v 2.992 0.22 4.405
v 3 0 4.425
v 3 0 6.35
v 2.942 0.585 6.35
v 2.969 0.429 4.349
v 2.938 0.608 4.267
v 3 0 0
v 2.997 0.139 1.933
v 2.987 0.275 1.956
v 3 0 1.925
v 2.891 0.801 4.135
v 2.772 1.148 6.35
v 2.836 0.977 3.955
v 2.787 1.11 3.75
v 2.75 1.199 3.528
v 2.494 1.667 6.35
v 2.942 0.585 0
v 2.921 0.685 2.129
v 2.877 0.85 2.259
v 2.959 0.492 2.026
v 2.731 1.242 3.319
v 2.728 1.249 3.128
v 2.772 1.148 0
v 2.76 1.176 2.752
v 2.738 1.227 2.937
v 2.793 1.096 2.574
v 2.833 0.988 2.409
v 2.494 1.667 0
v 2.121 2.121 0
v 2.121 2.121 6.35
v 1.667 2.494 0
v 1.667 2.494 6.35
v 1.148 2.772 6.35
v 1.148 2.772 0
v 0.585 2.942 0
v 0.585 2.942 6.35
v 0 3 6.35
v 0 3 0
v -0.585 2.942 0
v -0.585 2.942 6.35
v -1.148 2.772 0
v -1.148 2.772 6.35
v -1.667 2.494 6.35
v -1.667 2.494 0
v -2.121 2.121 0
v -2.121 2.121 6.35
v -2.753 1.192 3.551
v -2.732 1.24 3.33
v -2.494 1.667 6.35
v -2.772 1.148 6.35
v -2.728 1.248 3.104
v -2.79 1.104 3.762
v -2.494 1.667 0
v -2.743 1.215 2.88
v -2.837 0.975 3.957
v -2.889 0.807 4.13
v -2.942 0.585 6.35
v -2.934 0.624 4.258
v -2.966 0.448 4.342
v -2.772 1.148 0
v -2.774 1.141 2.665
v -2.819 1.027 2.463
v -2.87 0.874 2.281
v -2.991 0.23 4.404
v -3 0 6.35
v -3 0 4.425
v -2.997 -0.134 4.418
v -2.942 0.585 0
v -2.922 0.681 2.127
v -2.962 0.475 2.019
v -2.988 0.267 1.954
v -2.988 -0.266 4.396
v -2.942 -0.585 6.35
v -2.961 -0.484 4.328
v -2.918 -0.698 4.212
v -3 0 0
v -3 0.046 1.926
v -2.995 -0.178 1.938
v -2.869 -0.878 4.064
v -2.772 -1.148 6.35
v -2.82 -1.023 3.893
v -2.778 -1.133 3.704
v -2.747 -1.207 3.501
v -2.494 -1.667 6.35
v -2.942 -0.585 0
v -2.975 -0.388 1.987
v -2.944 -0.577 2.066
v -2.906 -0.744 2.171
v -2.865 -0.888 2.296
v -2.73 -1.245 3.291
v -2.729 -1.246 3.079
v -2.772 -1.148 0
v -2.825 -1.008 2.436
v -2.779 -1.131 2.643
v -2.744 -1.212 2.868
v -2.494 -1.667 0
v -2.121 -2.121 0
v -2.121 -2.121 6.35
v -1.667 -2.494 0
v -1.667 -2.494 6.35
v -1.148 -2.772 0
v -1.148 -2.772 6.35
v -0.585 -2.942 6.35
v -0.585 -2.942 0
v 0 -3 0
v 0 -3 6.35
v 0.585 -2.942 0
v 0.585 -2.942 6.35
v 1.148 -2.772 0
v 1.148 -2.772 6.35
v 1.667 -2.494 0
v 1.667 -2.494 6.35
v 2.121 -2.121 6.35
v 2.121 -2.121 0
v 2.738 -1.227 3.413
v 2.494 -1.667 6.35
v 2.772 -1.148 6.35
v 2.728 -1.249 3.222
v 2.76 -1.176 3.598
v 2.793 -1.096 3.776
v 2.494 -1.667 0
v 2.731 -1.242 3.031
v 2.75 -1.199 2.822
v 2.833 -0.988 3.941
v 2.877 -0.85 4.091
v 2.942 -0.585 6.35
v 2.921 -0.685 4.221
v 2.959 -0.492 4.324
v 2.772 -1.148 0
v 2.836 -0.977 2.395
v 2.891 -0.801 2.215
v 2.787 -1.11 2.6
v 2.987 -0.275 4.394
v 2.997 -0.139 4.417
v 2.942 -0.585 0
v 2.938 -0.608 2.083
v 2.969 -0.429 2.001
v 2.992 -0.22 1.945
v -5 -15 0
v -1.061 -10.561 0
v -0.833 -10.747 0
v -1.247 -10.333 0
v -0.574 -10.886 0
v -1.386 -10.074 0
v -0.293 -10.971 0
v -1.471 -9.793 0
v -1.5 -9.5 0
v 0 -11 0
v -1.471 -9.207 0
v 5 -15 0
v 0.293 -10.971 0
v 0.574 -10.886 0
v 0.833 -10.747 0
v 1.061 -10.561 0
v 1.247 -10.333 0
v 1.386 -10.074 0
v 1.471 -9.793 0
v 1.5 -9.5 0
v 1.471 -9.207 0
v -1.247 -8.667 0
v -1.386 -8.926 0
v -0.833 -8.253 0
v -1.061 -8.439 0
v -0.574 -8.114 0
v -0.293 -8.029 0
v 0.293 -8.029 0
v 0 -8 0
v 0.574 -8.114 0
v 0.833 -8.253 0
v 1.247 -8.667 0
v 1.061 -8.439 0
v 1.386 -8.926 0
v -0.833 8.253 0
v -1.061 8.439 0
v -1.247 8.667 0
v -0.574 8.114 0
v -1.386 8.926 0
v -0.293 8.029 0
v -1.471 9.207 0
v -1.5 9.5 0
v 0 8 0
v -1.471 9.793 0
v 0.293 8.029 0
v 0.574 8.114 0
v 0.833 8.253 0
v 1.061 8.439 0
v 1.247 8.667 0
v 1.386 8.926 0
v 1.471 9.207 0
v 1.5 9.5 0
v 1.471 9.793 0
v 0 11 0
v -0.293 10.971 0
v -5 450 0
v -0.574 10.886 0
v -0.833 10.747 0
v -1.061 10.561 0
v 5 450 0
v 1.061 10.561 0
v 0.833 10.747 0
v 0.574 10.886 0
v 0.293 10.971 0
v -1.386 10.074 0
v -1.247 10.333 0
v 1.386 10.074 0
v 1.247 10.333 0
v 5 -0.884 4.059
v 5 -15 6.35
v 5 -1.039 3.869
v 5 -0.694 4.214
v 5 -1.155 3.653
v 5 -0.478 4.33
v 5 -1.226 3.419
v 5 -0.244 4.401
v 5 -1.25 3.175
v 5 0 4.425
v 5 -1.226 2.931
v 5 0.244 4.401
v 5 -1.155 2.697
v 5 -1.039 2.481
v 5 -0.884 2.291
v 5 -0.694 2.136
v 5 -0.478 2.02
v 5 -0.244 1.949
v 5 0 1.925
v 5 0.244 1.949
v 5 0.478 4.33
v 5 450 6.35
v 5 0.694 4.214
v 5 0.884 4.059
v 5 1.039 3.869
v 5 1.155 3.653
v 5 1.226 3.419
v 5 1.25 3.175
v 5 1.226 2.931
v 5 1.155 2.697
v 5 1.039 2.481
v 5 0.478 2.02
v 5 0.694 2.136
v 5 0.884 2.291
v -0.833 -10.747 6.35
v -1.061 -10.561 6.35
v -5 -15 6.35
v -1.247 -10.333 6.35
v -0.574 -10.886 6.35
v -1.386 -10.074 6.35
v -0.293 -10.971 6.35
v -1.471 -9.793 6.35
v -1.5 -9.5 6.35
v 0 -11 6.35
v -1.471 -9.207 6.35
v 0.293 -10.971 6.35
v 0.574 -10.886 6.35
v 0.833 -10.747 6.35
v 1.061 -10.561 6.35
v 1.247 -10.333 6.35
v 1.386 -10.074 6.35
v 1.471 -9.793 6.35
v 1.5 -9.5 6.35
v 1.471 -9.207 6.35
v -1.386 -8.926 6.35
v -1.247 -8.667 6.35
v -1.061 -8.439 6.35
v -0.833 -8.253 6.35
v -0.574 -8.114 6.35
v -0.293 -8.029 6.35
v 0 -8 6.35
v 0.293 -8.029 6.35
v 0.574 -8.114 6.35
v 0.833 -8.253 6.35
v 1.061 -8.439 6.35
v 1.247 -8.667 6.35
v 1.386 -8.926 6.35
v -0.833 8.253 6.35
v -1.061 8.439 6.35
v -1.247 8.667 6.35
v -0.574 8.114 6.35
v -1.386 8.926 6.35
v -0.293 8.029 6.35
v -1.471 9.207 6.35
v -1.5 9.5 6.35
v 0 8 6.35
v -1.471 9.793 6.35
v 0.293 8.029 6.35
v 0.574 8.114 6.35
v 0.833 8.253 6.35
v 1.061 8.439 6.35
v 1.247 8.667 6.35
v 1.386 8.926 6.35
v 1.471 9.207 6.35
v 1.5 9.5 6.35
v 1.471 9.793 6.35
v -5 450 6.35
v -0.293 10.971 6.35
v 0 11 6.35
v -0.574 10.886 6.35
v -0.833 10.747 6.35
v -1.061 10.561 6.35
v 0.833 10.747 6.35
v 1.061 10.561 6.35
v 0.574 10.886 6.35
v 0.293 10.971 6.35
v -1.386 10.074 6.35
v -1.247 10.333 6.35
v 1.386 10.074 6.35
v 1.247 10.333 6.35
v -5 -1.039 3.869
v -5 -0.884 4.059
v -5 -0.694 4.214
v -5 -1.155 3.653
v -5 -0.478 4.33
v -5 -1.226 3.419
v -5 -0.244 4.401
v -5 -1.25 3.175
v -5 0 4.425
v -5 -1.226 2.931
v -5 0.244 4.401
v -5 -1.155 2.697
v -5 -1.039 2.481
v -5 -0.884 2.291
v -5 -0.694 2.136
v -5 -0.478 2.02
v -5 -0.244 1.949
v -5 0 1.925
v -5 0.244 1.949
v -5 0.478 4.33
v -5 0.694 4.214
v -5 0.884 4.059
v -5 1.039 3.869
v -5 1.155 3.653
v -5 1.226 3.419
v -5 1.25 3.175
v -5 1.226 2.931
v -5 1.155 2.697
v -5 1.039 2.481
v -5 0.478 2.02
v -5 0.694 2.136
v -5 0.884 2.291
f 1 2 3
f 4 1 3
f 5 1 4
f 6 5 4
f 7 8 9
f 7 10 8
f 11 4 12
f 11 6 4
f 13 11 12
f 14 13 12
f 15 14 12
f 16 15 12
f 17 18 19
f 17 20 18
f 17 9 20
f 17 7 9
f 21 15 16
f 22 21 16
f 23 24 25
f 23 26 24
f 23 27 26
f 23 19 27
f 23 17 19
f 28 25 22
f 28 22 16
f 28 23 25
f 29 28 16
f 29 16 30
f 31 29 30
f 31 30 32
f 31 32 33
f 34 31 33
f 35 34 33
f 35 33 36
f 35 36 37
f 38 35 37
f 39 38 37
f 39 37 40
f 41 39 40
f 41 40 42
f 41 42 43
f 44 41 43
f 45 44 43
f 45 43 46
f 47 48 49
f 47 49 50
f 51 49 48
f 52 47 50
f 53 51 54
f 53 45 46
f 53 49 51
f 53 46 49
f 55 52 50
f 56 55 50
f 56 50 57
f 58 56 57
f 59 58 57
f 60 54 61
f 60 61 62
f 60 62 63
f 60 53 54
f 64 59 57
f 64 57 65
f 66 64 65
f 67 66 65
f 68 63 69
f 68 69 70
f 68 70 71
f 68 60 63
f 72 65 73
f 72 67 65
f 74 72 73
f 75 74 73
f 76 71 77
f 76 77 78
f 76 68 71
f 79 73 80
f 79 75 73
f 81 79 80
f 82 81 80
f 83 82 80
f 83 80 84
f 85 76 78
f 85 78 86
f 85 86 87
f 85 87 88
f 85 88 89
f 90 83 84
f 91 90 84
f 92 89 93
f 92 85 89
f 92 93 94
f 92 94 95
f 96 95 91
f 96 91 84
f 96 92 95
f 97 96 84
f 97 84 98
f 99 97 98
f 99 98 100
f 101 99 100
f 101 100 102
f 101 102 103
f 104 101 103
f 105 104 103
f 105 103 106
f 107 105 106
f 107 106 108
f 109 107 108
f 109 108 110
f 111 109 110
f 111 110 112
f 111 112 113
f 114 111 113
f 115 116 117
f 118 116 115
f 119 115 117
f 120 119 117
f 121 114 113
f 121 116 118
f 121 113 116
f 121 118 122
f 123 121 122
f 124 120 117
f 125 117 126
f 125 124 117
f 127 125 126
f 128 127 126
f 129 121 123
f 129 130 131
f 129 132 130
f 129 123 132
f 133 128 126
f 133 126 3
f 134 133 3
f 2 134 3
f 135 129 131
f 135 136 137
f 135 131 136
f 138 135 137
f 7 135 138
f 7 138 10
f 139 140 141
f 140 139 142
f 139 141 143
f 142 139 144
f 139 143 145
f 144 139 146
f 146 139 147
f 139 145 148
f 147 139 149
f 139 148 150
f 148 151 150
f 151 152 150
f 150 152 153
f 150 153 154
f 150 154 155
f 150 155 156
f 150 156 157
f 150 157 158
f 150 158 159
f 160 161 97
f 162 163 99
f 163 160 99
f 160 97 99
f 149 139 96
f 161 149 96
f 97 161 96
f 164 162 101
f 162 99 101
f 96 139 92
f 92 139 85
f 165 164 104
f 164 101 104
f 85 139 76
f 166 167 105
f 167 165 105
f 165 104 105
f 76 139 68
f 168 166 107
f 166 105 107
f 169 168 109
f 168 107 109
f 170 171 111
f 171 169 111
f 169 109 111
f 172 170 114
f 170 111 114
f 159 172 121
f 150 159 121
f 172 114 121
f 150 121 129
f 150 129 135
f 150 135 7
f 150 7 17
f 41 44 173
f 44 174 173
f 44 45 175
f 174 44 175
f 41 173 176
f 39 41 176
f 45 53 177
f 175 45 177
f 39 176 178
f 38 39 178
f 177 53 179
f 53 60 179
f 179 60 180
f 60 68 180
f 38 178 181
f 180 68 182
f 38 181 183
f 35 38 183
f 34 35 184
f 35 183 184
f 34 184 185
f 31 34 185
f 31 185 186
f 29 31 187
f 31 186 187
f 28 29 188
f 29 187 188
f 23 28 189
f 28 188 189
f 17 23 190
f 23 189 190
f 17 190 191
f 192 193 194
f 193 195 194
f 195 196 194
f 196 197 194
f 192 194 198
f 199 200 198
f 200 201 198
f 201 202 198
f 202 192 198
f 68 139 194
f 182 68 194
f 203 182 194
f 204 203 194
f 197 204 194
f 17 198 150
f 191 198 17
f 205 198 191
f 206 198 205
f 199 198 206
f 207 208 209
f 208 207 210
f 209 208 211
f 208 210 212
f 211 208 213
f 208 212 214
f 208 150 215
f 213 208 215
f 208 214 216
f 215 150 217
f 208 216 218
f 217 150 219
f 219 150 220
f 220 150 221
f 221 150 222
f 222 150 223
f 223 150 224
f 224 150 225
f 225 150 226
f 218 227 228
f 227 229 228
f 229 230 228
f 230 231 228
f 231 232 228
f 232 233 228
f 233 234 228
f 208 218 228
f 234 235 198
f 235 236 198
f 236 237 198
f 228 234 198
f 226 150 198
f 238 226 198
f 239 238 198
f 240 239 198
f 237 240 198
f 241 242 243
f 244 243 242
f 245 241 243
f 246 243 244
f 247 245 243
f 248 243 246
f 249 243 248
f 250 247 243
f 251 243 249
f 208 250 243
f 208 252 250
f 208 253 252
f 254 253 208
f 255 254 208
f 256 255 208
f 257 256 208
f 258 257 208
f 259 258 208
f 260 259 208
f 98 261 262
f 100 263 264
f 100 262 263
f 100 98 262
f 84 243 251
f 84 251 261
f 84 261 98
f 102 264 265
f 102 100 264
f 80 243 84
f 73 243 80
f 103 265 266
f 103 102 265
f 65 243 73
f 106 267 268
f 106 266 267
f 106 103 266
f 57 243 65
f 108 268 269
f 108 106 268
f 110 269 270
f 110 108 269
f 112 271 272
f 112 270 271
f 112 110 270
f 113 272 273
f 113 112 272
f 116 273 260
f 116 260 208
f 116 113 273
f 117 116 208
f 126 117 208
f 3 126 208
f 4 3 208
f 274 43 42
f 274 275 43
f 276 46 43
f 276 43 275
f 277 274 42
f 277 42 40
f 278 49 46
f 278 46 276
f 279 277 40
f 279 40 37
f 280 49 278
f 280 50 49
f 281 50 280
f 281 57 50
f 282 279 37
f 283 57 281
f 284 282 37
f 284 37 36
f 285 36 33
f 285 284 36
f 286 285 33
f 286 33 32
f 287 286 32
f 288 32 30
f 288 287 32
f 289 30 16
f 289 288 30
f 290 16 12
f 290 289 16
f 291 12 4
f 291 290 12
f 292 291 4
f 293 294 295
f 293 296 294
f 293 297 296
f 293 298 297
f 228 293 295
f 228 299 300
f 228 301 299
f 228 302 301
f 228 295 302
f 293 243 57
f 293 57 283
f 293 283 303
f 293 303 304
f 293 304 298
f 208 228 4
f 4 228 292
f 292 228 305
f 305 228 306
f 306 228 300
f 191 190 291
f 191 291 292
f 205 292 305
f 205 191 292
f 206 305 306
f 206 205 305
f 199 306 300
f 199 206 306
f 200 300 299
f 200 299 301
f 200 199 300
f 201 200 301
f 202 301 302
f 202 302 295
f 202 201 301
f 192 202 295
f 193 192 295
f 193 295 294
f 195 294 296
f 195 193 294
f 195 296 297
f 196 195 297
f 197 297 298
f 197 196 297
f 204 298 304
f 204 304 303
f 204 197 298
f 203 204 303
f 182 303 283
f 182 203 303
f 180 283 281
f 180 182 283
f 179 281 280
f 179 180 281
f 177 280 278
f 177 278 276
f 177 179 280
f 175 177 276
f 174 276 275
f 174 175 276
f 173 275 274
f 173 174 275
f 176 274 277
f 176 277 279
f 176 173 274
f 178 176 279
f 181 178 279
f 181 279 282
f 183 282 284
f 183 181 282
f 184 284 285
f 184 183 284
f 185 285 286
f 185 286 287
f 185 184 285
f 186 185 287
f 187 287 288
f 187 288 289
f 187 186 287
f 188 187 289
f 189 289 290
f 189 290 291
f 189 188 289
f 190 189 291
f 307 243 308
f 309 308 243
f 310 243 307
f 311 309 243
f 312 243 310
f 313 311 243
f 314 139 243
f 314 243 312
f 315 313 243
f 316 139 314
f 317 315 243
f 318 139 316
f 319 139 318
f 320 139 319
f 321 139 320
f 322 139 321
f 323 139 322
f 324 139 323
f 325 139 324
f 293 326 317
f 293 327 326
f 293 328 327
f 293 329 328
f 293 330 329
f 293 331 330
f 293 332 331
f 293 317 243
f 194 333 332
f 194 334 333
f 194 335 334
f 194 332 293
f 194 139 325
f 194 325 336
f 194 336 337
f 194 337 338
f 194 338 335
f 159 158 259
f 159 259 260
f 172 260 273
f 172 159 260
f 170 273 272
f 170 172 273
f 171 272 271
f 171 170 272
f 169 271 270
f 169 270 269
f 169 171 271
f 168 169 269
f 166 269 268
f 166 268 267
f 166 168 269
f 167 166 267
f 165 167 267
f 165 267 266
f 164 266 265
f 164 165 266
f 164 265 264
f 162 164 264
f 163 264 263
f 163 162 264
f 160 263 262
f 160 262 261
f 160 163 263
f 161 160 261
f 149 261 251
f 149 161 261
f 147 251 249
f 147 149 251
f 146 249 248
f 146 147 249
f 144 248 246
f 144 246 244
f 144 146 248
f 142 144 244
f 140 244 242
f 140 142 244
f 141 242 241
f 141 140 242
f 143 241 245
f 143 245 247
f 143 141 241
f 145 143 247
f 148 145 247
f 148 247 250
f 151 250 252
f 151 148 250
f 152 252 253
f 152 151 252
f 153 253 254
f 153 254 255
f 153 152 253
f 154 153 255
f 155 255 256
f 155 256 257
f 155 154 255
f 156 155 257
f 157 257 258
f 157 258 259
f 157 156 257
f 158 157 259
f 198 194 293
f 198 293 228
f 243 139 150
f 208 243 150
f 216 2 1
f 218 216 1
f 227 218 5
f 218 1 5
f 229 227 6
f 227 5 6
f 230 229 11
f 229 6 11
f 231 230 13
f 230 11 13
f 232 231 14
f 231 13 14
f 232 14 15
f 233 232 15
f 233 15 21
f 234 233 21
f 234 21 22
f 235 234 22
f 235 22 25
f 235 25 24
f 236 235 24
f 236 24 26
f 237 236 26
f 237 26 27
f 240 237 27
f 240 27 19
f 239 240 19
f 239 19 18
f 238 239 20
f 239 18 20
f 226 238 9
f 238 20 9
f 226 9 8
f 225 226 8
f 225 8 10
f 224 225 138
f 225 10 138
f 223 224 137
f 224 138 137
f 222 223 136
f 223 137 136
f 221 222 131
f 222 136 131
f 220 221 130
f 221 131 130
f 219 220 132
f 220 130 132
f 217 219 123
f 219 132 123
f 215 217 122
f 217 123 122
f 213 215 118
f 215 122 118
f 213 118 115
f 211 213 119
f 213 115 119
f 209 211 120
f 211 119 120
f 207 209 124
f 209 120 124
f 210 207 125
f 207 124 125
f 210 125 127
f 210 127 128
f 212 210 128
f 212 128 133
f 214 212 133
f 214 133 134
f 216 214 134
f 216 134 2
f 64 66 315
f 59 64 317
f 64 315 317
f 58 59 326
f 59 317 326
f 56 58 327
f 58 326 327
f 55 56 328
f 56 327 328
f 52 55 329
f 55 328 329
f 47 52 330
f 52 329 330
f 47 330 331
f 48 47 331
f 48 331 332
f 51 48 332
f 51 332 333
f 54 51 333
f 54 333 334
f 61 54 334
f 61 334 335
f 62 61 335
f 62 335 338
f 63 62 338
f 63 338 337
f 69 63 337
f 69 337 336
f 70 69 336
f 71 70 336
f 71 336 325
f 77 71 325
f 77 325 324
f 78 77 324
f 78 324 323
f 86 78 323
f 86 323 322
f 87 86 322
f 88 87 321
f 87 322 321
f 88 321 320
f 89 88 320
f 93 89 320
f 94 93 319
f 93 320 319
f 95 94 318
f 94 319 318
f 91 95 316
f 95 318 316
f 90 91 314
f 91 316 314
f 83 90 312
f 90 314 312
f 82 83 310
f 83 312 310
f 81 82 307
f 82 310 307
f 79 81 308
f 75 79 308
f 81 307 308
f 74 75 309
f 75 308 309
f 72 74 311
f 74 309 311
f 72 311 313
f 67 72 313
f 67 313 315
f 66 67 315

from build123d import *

# Parameters (mm, degrees)
SKETCH1_W                   = 10
SKETCH1_H                   = 465
SKETCH1_R                   = 1.5
SKETCH1_R_2                 = 3
BOSS_EXTRUDE1_DEPTH         = 6.35
TAP_DRILL_FOR_M3X0_5_TAP1_D = 2.5


with BuildPart() as part:
    # Sketch1 → Boss-Extrude1 (new body)
    with BuildSketch(Plane.XY):
        with Locations((0, 217.5)):
            Rectangle(SKETCH1_W, SKETCH1_H)
        with Locations((0, -9.5)):
            Circle(SKETCH1_R, mode=Mode.SUBTRACT)
        Circle(SKETCH1_R_2, mode=Mode.SUBTRACT)
        with Locations((0, 9.5)):
            Circle(SKETCH1_R, mode=Mode.SUBTRACT)
    extrude(amount=BOSS_EXTRUDE1_DEPTH)

    # Tap Drill for M3x0.5 Tap1 (through all)
    with Locations(Plane(origin=(5, 0, 0), x_dir=(0, 0, -1), z_dir=(1, 0, 0))):
        with Locations((-3.175, 0)):
            Hole(TAP_DRILL_FOR_M3X0_5_TAP1_D / 2)


solid = part.part
